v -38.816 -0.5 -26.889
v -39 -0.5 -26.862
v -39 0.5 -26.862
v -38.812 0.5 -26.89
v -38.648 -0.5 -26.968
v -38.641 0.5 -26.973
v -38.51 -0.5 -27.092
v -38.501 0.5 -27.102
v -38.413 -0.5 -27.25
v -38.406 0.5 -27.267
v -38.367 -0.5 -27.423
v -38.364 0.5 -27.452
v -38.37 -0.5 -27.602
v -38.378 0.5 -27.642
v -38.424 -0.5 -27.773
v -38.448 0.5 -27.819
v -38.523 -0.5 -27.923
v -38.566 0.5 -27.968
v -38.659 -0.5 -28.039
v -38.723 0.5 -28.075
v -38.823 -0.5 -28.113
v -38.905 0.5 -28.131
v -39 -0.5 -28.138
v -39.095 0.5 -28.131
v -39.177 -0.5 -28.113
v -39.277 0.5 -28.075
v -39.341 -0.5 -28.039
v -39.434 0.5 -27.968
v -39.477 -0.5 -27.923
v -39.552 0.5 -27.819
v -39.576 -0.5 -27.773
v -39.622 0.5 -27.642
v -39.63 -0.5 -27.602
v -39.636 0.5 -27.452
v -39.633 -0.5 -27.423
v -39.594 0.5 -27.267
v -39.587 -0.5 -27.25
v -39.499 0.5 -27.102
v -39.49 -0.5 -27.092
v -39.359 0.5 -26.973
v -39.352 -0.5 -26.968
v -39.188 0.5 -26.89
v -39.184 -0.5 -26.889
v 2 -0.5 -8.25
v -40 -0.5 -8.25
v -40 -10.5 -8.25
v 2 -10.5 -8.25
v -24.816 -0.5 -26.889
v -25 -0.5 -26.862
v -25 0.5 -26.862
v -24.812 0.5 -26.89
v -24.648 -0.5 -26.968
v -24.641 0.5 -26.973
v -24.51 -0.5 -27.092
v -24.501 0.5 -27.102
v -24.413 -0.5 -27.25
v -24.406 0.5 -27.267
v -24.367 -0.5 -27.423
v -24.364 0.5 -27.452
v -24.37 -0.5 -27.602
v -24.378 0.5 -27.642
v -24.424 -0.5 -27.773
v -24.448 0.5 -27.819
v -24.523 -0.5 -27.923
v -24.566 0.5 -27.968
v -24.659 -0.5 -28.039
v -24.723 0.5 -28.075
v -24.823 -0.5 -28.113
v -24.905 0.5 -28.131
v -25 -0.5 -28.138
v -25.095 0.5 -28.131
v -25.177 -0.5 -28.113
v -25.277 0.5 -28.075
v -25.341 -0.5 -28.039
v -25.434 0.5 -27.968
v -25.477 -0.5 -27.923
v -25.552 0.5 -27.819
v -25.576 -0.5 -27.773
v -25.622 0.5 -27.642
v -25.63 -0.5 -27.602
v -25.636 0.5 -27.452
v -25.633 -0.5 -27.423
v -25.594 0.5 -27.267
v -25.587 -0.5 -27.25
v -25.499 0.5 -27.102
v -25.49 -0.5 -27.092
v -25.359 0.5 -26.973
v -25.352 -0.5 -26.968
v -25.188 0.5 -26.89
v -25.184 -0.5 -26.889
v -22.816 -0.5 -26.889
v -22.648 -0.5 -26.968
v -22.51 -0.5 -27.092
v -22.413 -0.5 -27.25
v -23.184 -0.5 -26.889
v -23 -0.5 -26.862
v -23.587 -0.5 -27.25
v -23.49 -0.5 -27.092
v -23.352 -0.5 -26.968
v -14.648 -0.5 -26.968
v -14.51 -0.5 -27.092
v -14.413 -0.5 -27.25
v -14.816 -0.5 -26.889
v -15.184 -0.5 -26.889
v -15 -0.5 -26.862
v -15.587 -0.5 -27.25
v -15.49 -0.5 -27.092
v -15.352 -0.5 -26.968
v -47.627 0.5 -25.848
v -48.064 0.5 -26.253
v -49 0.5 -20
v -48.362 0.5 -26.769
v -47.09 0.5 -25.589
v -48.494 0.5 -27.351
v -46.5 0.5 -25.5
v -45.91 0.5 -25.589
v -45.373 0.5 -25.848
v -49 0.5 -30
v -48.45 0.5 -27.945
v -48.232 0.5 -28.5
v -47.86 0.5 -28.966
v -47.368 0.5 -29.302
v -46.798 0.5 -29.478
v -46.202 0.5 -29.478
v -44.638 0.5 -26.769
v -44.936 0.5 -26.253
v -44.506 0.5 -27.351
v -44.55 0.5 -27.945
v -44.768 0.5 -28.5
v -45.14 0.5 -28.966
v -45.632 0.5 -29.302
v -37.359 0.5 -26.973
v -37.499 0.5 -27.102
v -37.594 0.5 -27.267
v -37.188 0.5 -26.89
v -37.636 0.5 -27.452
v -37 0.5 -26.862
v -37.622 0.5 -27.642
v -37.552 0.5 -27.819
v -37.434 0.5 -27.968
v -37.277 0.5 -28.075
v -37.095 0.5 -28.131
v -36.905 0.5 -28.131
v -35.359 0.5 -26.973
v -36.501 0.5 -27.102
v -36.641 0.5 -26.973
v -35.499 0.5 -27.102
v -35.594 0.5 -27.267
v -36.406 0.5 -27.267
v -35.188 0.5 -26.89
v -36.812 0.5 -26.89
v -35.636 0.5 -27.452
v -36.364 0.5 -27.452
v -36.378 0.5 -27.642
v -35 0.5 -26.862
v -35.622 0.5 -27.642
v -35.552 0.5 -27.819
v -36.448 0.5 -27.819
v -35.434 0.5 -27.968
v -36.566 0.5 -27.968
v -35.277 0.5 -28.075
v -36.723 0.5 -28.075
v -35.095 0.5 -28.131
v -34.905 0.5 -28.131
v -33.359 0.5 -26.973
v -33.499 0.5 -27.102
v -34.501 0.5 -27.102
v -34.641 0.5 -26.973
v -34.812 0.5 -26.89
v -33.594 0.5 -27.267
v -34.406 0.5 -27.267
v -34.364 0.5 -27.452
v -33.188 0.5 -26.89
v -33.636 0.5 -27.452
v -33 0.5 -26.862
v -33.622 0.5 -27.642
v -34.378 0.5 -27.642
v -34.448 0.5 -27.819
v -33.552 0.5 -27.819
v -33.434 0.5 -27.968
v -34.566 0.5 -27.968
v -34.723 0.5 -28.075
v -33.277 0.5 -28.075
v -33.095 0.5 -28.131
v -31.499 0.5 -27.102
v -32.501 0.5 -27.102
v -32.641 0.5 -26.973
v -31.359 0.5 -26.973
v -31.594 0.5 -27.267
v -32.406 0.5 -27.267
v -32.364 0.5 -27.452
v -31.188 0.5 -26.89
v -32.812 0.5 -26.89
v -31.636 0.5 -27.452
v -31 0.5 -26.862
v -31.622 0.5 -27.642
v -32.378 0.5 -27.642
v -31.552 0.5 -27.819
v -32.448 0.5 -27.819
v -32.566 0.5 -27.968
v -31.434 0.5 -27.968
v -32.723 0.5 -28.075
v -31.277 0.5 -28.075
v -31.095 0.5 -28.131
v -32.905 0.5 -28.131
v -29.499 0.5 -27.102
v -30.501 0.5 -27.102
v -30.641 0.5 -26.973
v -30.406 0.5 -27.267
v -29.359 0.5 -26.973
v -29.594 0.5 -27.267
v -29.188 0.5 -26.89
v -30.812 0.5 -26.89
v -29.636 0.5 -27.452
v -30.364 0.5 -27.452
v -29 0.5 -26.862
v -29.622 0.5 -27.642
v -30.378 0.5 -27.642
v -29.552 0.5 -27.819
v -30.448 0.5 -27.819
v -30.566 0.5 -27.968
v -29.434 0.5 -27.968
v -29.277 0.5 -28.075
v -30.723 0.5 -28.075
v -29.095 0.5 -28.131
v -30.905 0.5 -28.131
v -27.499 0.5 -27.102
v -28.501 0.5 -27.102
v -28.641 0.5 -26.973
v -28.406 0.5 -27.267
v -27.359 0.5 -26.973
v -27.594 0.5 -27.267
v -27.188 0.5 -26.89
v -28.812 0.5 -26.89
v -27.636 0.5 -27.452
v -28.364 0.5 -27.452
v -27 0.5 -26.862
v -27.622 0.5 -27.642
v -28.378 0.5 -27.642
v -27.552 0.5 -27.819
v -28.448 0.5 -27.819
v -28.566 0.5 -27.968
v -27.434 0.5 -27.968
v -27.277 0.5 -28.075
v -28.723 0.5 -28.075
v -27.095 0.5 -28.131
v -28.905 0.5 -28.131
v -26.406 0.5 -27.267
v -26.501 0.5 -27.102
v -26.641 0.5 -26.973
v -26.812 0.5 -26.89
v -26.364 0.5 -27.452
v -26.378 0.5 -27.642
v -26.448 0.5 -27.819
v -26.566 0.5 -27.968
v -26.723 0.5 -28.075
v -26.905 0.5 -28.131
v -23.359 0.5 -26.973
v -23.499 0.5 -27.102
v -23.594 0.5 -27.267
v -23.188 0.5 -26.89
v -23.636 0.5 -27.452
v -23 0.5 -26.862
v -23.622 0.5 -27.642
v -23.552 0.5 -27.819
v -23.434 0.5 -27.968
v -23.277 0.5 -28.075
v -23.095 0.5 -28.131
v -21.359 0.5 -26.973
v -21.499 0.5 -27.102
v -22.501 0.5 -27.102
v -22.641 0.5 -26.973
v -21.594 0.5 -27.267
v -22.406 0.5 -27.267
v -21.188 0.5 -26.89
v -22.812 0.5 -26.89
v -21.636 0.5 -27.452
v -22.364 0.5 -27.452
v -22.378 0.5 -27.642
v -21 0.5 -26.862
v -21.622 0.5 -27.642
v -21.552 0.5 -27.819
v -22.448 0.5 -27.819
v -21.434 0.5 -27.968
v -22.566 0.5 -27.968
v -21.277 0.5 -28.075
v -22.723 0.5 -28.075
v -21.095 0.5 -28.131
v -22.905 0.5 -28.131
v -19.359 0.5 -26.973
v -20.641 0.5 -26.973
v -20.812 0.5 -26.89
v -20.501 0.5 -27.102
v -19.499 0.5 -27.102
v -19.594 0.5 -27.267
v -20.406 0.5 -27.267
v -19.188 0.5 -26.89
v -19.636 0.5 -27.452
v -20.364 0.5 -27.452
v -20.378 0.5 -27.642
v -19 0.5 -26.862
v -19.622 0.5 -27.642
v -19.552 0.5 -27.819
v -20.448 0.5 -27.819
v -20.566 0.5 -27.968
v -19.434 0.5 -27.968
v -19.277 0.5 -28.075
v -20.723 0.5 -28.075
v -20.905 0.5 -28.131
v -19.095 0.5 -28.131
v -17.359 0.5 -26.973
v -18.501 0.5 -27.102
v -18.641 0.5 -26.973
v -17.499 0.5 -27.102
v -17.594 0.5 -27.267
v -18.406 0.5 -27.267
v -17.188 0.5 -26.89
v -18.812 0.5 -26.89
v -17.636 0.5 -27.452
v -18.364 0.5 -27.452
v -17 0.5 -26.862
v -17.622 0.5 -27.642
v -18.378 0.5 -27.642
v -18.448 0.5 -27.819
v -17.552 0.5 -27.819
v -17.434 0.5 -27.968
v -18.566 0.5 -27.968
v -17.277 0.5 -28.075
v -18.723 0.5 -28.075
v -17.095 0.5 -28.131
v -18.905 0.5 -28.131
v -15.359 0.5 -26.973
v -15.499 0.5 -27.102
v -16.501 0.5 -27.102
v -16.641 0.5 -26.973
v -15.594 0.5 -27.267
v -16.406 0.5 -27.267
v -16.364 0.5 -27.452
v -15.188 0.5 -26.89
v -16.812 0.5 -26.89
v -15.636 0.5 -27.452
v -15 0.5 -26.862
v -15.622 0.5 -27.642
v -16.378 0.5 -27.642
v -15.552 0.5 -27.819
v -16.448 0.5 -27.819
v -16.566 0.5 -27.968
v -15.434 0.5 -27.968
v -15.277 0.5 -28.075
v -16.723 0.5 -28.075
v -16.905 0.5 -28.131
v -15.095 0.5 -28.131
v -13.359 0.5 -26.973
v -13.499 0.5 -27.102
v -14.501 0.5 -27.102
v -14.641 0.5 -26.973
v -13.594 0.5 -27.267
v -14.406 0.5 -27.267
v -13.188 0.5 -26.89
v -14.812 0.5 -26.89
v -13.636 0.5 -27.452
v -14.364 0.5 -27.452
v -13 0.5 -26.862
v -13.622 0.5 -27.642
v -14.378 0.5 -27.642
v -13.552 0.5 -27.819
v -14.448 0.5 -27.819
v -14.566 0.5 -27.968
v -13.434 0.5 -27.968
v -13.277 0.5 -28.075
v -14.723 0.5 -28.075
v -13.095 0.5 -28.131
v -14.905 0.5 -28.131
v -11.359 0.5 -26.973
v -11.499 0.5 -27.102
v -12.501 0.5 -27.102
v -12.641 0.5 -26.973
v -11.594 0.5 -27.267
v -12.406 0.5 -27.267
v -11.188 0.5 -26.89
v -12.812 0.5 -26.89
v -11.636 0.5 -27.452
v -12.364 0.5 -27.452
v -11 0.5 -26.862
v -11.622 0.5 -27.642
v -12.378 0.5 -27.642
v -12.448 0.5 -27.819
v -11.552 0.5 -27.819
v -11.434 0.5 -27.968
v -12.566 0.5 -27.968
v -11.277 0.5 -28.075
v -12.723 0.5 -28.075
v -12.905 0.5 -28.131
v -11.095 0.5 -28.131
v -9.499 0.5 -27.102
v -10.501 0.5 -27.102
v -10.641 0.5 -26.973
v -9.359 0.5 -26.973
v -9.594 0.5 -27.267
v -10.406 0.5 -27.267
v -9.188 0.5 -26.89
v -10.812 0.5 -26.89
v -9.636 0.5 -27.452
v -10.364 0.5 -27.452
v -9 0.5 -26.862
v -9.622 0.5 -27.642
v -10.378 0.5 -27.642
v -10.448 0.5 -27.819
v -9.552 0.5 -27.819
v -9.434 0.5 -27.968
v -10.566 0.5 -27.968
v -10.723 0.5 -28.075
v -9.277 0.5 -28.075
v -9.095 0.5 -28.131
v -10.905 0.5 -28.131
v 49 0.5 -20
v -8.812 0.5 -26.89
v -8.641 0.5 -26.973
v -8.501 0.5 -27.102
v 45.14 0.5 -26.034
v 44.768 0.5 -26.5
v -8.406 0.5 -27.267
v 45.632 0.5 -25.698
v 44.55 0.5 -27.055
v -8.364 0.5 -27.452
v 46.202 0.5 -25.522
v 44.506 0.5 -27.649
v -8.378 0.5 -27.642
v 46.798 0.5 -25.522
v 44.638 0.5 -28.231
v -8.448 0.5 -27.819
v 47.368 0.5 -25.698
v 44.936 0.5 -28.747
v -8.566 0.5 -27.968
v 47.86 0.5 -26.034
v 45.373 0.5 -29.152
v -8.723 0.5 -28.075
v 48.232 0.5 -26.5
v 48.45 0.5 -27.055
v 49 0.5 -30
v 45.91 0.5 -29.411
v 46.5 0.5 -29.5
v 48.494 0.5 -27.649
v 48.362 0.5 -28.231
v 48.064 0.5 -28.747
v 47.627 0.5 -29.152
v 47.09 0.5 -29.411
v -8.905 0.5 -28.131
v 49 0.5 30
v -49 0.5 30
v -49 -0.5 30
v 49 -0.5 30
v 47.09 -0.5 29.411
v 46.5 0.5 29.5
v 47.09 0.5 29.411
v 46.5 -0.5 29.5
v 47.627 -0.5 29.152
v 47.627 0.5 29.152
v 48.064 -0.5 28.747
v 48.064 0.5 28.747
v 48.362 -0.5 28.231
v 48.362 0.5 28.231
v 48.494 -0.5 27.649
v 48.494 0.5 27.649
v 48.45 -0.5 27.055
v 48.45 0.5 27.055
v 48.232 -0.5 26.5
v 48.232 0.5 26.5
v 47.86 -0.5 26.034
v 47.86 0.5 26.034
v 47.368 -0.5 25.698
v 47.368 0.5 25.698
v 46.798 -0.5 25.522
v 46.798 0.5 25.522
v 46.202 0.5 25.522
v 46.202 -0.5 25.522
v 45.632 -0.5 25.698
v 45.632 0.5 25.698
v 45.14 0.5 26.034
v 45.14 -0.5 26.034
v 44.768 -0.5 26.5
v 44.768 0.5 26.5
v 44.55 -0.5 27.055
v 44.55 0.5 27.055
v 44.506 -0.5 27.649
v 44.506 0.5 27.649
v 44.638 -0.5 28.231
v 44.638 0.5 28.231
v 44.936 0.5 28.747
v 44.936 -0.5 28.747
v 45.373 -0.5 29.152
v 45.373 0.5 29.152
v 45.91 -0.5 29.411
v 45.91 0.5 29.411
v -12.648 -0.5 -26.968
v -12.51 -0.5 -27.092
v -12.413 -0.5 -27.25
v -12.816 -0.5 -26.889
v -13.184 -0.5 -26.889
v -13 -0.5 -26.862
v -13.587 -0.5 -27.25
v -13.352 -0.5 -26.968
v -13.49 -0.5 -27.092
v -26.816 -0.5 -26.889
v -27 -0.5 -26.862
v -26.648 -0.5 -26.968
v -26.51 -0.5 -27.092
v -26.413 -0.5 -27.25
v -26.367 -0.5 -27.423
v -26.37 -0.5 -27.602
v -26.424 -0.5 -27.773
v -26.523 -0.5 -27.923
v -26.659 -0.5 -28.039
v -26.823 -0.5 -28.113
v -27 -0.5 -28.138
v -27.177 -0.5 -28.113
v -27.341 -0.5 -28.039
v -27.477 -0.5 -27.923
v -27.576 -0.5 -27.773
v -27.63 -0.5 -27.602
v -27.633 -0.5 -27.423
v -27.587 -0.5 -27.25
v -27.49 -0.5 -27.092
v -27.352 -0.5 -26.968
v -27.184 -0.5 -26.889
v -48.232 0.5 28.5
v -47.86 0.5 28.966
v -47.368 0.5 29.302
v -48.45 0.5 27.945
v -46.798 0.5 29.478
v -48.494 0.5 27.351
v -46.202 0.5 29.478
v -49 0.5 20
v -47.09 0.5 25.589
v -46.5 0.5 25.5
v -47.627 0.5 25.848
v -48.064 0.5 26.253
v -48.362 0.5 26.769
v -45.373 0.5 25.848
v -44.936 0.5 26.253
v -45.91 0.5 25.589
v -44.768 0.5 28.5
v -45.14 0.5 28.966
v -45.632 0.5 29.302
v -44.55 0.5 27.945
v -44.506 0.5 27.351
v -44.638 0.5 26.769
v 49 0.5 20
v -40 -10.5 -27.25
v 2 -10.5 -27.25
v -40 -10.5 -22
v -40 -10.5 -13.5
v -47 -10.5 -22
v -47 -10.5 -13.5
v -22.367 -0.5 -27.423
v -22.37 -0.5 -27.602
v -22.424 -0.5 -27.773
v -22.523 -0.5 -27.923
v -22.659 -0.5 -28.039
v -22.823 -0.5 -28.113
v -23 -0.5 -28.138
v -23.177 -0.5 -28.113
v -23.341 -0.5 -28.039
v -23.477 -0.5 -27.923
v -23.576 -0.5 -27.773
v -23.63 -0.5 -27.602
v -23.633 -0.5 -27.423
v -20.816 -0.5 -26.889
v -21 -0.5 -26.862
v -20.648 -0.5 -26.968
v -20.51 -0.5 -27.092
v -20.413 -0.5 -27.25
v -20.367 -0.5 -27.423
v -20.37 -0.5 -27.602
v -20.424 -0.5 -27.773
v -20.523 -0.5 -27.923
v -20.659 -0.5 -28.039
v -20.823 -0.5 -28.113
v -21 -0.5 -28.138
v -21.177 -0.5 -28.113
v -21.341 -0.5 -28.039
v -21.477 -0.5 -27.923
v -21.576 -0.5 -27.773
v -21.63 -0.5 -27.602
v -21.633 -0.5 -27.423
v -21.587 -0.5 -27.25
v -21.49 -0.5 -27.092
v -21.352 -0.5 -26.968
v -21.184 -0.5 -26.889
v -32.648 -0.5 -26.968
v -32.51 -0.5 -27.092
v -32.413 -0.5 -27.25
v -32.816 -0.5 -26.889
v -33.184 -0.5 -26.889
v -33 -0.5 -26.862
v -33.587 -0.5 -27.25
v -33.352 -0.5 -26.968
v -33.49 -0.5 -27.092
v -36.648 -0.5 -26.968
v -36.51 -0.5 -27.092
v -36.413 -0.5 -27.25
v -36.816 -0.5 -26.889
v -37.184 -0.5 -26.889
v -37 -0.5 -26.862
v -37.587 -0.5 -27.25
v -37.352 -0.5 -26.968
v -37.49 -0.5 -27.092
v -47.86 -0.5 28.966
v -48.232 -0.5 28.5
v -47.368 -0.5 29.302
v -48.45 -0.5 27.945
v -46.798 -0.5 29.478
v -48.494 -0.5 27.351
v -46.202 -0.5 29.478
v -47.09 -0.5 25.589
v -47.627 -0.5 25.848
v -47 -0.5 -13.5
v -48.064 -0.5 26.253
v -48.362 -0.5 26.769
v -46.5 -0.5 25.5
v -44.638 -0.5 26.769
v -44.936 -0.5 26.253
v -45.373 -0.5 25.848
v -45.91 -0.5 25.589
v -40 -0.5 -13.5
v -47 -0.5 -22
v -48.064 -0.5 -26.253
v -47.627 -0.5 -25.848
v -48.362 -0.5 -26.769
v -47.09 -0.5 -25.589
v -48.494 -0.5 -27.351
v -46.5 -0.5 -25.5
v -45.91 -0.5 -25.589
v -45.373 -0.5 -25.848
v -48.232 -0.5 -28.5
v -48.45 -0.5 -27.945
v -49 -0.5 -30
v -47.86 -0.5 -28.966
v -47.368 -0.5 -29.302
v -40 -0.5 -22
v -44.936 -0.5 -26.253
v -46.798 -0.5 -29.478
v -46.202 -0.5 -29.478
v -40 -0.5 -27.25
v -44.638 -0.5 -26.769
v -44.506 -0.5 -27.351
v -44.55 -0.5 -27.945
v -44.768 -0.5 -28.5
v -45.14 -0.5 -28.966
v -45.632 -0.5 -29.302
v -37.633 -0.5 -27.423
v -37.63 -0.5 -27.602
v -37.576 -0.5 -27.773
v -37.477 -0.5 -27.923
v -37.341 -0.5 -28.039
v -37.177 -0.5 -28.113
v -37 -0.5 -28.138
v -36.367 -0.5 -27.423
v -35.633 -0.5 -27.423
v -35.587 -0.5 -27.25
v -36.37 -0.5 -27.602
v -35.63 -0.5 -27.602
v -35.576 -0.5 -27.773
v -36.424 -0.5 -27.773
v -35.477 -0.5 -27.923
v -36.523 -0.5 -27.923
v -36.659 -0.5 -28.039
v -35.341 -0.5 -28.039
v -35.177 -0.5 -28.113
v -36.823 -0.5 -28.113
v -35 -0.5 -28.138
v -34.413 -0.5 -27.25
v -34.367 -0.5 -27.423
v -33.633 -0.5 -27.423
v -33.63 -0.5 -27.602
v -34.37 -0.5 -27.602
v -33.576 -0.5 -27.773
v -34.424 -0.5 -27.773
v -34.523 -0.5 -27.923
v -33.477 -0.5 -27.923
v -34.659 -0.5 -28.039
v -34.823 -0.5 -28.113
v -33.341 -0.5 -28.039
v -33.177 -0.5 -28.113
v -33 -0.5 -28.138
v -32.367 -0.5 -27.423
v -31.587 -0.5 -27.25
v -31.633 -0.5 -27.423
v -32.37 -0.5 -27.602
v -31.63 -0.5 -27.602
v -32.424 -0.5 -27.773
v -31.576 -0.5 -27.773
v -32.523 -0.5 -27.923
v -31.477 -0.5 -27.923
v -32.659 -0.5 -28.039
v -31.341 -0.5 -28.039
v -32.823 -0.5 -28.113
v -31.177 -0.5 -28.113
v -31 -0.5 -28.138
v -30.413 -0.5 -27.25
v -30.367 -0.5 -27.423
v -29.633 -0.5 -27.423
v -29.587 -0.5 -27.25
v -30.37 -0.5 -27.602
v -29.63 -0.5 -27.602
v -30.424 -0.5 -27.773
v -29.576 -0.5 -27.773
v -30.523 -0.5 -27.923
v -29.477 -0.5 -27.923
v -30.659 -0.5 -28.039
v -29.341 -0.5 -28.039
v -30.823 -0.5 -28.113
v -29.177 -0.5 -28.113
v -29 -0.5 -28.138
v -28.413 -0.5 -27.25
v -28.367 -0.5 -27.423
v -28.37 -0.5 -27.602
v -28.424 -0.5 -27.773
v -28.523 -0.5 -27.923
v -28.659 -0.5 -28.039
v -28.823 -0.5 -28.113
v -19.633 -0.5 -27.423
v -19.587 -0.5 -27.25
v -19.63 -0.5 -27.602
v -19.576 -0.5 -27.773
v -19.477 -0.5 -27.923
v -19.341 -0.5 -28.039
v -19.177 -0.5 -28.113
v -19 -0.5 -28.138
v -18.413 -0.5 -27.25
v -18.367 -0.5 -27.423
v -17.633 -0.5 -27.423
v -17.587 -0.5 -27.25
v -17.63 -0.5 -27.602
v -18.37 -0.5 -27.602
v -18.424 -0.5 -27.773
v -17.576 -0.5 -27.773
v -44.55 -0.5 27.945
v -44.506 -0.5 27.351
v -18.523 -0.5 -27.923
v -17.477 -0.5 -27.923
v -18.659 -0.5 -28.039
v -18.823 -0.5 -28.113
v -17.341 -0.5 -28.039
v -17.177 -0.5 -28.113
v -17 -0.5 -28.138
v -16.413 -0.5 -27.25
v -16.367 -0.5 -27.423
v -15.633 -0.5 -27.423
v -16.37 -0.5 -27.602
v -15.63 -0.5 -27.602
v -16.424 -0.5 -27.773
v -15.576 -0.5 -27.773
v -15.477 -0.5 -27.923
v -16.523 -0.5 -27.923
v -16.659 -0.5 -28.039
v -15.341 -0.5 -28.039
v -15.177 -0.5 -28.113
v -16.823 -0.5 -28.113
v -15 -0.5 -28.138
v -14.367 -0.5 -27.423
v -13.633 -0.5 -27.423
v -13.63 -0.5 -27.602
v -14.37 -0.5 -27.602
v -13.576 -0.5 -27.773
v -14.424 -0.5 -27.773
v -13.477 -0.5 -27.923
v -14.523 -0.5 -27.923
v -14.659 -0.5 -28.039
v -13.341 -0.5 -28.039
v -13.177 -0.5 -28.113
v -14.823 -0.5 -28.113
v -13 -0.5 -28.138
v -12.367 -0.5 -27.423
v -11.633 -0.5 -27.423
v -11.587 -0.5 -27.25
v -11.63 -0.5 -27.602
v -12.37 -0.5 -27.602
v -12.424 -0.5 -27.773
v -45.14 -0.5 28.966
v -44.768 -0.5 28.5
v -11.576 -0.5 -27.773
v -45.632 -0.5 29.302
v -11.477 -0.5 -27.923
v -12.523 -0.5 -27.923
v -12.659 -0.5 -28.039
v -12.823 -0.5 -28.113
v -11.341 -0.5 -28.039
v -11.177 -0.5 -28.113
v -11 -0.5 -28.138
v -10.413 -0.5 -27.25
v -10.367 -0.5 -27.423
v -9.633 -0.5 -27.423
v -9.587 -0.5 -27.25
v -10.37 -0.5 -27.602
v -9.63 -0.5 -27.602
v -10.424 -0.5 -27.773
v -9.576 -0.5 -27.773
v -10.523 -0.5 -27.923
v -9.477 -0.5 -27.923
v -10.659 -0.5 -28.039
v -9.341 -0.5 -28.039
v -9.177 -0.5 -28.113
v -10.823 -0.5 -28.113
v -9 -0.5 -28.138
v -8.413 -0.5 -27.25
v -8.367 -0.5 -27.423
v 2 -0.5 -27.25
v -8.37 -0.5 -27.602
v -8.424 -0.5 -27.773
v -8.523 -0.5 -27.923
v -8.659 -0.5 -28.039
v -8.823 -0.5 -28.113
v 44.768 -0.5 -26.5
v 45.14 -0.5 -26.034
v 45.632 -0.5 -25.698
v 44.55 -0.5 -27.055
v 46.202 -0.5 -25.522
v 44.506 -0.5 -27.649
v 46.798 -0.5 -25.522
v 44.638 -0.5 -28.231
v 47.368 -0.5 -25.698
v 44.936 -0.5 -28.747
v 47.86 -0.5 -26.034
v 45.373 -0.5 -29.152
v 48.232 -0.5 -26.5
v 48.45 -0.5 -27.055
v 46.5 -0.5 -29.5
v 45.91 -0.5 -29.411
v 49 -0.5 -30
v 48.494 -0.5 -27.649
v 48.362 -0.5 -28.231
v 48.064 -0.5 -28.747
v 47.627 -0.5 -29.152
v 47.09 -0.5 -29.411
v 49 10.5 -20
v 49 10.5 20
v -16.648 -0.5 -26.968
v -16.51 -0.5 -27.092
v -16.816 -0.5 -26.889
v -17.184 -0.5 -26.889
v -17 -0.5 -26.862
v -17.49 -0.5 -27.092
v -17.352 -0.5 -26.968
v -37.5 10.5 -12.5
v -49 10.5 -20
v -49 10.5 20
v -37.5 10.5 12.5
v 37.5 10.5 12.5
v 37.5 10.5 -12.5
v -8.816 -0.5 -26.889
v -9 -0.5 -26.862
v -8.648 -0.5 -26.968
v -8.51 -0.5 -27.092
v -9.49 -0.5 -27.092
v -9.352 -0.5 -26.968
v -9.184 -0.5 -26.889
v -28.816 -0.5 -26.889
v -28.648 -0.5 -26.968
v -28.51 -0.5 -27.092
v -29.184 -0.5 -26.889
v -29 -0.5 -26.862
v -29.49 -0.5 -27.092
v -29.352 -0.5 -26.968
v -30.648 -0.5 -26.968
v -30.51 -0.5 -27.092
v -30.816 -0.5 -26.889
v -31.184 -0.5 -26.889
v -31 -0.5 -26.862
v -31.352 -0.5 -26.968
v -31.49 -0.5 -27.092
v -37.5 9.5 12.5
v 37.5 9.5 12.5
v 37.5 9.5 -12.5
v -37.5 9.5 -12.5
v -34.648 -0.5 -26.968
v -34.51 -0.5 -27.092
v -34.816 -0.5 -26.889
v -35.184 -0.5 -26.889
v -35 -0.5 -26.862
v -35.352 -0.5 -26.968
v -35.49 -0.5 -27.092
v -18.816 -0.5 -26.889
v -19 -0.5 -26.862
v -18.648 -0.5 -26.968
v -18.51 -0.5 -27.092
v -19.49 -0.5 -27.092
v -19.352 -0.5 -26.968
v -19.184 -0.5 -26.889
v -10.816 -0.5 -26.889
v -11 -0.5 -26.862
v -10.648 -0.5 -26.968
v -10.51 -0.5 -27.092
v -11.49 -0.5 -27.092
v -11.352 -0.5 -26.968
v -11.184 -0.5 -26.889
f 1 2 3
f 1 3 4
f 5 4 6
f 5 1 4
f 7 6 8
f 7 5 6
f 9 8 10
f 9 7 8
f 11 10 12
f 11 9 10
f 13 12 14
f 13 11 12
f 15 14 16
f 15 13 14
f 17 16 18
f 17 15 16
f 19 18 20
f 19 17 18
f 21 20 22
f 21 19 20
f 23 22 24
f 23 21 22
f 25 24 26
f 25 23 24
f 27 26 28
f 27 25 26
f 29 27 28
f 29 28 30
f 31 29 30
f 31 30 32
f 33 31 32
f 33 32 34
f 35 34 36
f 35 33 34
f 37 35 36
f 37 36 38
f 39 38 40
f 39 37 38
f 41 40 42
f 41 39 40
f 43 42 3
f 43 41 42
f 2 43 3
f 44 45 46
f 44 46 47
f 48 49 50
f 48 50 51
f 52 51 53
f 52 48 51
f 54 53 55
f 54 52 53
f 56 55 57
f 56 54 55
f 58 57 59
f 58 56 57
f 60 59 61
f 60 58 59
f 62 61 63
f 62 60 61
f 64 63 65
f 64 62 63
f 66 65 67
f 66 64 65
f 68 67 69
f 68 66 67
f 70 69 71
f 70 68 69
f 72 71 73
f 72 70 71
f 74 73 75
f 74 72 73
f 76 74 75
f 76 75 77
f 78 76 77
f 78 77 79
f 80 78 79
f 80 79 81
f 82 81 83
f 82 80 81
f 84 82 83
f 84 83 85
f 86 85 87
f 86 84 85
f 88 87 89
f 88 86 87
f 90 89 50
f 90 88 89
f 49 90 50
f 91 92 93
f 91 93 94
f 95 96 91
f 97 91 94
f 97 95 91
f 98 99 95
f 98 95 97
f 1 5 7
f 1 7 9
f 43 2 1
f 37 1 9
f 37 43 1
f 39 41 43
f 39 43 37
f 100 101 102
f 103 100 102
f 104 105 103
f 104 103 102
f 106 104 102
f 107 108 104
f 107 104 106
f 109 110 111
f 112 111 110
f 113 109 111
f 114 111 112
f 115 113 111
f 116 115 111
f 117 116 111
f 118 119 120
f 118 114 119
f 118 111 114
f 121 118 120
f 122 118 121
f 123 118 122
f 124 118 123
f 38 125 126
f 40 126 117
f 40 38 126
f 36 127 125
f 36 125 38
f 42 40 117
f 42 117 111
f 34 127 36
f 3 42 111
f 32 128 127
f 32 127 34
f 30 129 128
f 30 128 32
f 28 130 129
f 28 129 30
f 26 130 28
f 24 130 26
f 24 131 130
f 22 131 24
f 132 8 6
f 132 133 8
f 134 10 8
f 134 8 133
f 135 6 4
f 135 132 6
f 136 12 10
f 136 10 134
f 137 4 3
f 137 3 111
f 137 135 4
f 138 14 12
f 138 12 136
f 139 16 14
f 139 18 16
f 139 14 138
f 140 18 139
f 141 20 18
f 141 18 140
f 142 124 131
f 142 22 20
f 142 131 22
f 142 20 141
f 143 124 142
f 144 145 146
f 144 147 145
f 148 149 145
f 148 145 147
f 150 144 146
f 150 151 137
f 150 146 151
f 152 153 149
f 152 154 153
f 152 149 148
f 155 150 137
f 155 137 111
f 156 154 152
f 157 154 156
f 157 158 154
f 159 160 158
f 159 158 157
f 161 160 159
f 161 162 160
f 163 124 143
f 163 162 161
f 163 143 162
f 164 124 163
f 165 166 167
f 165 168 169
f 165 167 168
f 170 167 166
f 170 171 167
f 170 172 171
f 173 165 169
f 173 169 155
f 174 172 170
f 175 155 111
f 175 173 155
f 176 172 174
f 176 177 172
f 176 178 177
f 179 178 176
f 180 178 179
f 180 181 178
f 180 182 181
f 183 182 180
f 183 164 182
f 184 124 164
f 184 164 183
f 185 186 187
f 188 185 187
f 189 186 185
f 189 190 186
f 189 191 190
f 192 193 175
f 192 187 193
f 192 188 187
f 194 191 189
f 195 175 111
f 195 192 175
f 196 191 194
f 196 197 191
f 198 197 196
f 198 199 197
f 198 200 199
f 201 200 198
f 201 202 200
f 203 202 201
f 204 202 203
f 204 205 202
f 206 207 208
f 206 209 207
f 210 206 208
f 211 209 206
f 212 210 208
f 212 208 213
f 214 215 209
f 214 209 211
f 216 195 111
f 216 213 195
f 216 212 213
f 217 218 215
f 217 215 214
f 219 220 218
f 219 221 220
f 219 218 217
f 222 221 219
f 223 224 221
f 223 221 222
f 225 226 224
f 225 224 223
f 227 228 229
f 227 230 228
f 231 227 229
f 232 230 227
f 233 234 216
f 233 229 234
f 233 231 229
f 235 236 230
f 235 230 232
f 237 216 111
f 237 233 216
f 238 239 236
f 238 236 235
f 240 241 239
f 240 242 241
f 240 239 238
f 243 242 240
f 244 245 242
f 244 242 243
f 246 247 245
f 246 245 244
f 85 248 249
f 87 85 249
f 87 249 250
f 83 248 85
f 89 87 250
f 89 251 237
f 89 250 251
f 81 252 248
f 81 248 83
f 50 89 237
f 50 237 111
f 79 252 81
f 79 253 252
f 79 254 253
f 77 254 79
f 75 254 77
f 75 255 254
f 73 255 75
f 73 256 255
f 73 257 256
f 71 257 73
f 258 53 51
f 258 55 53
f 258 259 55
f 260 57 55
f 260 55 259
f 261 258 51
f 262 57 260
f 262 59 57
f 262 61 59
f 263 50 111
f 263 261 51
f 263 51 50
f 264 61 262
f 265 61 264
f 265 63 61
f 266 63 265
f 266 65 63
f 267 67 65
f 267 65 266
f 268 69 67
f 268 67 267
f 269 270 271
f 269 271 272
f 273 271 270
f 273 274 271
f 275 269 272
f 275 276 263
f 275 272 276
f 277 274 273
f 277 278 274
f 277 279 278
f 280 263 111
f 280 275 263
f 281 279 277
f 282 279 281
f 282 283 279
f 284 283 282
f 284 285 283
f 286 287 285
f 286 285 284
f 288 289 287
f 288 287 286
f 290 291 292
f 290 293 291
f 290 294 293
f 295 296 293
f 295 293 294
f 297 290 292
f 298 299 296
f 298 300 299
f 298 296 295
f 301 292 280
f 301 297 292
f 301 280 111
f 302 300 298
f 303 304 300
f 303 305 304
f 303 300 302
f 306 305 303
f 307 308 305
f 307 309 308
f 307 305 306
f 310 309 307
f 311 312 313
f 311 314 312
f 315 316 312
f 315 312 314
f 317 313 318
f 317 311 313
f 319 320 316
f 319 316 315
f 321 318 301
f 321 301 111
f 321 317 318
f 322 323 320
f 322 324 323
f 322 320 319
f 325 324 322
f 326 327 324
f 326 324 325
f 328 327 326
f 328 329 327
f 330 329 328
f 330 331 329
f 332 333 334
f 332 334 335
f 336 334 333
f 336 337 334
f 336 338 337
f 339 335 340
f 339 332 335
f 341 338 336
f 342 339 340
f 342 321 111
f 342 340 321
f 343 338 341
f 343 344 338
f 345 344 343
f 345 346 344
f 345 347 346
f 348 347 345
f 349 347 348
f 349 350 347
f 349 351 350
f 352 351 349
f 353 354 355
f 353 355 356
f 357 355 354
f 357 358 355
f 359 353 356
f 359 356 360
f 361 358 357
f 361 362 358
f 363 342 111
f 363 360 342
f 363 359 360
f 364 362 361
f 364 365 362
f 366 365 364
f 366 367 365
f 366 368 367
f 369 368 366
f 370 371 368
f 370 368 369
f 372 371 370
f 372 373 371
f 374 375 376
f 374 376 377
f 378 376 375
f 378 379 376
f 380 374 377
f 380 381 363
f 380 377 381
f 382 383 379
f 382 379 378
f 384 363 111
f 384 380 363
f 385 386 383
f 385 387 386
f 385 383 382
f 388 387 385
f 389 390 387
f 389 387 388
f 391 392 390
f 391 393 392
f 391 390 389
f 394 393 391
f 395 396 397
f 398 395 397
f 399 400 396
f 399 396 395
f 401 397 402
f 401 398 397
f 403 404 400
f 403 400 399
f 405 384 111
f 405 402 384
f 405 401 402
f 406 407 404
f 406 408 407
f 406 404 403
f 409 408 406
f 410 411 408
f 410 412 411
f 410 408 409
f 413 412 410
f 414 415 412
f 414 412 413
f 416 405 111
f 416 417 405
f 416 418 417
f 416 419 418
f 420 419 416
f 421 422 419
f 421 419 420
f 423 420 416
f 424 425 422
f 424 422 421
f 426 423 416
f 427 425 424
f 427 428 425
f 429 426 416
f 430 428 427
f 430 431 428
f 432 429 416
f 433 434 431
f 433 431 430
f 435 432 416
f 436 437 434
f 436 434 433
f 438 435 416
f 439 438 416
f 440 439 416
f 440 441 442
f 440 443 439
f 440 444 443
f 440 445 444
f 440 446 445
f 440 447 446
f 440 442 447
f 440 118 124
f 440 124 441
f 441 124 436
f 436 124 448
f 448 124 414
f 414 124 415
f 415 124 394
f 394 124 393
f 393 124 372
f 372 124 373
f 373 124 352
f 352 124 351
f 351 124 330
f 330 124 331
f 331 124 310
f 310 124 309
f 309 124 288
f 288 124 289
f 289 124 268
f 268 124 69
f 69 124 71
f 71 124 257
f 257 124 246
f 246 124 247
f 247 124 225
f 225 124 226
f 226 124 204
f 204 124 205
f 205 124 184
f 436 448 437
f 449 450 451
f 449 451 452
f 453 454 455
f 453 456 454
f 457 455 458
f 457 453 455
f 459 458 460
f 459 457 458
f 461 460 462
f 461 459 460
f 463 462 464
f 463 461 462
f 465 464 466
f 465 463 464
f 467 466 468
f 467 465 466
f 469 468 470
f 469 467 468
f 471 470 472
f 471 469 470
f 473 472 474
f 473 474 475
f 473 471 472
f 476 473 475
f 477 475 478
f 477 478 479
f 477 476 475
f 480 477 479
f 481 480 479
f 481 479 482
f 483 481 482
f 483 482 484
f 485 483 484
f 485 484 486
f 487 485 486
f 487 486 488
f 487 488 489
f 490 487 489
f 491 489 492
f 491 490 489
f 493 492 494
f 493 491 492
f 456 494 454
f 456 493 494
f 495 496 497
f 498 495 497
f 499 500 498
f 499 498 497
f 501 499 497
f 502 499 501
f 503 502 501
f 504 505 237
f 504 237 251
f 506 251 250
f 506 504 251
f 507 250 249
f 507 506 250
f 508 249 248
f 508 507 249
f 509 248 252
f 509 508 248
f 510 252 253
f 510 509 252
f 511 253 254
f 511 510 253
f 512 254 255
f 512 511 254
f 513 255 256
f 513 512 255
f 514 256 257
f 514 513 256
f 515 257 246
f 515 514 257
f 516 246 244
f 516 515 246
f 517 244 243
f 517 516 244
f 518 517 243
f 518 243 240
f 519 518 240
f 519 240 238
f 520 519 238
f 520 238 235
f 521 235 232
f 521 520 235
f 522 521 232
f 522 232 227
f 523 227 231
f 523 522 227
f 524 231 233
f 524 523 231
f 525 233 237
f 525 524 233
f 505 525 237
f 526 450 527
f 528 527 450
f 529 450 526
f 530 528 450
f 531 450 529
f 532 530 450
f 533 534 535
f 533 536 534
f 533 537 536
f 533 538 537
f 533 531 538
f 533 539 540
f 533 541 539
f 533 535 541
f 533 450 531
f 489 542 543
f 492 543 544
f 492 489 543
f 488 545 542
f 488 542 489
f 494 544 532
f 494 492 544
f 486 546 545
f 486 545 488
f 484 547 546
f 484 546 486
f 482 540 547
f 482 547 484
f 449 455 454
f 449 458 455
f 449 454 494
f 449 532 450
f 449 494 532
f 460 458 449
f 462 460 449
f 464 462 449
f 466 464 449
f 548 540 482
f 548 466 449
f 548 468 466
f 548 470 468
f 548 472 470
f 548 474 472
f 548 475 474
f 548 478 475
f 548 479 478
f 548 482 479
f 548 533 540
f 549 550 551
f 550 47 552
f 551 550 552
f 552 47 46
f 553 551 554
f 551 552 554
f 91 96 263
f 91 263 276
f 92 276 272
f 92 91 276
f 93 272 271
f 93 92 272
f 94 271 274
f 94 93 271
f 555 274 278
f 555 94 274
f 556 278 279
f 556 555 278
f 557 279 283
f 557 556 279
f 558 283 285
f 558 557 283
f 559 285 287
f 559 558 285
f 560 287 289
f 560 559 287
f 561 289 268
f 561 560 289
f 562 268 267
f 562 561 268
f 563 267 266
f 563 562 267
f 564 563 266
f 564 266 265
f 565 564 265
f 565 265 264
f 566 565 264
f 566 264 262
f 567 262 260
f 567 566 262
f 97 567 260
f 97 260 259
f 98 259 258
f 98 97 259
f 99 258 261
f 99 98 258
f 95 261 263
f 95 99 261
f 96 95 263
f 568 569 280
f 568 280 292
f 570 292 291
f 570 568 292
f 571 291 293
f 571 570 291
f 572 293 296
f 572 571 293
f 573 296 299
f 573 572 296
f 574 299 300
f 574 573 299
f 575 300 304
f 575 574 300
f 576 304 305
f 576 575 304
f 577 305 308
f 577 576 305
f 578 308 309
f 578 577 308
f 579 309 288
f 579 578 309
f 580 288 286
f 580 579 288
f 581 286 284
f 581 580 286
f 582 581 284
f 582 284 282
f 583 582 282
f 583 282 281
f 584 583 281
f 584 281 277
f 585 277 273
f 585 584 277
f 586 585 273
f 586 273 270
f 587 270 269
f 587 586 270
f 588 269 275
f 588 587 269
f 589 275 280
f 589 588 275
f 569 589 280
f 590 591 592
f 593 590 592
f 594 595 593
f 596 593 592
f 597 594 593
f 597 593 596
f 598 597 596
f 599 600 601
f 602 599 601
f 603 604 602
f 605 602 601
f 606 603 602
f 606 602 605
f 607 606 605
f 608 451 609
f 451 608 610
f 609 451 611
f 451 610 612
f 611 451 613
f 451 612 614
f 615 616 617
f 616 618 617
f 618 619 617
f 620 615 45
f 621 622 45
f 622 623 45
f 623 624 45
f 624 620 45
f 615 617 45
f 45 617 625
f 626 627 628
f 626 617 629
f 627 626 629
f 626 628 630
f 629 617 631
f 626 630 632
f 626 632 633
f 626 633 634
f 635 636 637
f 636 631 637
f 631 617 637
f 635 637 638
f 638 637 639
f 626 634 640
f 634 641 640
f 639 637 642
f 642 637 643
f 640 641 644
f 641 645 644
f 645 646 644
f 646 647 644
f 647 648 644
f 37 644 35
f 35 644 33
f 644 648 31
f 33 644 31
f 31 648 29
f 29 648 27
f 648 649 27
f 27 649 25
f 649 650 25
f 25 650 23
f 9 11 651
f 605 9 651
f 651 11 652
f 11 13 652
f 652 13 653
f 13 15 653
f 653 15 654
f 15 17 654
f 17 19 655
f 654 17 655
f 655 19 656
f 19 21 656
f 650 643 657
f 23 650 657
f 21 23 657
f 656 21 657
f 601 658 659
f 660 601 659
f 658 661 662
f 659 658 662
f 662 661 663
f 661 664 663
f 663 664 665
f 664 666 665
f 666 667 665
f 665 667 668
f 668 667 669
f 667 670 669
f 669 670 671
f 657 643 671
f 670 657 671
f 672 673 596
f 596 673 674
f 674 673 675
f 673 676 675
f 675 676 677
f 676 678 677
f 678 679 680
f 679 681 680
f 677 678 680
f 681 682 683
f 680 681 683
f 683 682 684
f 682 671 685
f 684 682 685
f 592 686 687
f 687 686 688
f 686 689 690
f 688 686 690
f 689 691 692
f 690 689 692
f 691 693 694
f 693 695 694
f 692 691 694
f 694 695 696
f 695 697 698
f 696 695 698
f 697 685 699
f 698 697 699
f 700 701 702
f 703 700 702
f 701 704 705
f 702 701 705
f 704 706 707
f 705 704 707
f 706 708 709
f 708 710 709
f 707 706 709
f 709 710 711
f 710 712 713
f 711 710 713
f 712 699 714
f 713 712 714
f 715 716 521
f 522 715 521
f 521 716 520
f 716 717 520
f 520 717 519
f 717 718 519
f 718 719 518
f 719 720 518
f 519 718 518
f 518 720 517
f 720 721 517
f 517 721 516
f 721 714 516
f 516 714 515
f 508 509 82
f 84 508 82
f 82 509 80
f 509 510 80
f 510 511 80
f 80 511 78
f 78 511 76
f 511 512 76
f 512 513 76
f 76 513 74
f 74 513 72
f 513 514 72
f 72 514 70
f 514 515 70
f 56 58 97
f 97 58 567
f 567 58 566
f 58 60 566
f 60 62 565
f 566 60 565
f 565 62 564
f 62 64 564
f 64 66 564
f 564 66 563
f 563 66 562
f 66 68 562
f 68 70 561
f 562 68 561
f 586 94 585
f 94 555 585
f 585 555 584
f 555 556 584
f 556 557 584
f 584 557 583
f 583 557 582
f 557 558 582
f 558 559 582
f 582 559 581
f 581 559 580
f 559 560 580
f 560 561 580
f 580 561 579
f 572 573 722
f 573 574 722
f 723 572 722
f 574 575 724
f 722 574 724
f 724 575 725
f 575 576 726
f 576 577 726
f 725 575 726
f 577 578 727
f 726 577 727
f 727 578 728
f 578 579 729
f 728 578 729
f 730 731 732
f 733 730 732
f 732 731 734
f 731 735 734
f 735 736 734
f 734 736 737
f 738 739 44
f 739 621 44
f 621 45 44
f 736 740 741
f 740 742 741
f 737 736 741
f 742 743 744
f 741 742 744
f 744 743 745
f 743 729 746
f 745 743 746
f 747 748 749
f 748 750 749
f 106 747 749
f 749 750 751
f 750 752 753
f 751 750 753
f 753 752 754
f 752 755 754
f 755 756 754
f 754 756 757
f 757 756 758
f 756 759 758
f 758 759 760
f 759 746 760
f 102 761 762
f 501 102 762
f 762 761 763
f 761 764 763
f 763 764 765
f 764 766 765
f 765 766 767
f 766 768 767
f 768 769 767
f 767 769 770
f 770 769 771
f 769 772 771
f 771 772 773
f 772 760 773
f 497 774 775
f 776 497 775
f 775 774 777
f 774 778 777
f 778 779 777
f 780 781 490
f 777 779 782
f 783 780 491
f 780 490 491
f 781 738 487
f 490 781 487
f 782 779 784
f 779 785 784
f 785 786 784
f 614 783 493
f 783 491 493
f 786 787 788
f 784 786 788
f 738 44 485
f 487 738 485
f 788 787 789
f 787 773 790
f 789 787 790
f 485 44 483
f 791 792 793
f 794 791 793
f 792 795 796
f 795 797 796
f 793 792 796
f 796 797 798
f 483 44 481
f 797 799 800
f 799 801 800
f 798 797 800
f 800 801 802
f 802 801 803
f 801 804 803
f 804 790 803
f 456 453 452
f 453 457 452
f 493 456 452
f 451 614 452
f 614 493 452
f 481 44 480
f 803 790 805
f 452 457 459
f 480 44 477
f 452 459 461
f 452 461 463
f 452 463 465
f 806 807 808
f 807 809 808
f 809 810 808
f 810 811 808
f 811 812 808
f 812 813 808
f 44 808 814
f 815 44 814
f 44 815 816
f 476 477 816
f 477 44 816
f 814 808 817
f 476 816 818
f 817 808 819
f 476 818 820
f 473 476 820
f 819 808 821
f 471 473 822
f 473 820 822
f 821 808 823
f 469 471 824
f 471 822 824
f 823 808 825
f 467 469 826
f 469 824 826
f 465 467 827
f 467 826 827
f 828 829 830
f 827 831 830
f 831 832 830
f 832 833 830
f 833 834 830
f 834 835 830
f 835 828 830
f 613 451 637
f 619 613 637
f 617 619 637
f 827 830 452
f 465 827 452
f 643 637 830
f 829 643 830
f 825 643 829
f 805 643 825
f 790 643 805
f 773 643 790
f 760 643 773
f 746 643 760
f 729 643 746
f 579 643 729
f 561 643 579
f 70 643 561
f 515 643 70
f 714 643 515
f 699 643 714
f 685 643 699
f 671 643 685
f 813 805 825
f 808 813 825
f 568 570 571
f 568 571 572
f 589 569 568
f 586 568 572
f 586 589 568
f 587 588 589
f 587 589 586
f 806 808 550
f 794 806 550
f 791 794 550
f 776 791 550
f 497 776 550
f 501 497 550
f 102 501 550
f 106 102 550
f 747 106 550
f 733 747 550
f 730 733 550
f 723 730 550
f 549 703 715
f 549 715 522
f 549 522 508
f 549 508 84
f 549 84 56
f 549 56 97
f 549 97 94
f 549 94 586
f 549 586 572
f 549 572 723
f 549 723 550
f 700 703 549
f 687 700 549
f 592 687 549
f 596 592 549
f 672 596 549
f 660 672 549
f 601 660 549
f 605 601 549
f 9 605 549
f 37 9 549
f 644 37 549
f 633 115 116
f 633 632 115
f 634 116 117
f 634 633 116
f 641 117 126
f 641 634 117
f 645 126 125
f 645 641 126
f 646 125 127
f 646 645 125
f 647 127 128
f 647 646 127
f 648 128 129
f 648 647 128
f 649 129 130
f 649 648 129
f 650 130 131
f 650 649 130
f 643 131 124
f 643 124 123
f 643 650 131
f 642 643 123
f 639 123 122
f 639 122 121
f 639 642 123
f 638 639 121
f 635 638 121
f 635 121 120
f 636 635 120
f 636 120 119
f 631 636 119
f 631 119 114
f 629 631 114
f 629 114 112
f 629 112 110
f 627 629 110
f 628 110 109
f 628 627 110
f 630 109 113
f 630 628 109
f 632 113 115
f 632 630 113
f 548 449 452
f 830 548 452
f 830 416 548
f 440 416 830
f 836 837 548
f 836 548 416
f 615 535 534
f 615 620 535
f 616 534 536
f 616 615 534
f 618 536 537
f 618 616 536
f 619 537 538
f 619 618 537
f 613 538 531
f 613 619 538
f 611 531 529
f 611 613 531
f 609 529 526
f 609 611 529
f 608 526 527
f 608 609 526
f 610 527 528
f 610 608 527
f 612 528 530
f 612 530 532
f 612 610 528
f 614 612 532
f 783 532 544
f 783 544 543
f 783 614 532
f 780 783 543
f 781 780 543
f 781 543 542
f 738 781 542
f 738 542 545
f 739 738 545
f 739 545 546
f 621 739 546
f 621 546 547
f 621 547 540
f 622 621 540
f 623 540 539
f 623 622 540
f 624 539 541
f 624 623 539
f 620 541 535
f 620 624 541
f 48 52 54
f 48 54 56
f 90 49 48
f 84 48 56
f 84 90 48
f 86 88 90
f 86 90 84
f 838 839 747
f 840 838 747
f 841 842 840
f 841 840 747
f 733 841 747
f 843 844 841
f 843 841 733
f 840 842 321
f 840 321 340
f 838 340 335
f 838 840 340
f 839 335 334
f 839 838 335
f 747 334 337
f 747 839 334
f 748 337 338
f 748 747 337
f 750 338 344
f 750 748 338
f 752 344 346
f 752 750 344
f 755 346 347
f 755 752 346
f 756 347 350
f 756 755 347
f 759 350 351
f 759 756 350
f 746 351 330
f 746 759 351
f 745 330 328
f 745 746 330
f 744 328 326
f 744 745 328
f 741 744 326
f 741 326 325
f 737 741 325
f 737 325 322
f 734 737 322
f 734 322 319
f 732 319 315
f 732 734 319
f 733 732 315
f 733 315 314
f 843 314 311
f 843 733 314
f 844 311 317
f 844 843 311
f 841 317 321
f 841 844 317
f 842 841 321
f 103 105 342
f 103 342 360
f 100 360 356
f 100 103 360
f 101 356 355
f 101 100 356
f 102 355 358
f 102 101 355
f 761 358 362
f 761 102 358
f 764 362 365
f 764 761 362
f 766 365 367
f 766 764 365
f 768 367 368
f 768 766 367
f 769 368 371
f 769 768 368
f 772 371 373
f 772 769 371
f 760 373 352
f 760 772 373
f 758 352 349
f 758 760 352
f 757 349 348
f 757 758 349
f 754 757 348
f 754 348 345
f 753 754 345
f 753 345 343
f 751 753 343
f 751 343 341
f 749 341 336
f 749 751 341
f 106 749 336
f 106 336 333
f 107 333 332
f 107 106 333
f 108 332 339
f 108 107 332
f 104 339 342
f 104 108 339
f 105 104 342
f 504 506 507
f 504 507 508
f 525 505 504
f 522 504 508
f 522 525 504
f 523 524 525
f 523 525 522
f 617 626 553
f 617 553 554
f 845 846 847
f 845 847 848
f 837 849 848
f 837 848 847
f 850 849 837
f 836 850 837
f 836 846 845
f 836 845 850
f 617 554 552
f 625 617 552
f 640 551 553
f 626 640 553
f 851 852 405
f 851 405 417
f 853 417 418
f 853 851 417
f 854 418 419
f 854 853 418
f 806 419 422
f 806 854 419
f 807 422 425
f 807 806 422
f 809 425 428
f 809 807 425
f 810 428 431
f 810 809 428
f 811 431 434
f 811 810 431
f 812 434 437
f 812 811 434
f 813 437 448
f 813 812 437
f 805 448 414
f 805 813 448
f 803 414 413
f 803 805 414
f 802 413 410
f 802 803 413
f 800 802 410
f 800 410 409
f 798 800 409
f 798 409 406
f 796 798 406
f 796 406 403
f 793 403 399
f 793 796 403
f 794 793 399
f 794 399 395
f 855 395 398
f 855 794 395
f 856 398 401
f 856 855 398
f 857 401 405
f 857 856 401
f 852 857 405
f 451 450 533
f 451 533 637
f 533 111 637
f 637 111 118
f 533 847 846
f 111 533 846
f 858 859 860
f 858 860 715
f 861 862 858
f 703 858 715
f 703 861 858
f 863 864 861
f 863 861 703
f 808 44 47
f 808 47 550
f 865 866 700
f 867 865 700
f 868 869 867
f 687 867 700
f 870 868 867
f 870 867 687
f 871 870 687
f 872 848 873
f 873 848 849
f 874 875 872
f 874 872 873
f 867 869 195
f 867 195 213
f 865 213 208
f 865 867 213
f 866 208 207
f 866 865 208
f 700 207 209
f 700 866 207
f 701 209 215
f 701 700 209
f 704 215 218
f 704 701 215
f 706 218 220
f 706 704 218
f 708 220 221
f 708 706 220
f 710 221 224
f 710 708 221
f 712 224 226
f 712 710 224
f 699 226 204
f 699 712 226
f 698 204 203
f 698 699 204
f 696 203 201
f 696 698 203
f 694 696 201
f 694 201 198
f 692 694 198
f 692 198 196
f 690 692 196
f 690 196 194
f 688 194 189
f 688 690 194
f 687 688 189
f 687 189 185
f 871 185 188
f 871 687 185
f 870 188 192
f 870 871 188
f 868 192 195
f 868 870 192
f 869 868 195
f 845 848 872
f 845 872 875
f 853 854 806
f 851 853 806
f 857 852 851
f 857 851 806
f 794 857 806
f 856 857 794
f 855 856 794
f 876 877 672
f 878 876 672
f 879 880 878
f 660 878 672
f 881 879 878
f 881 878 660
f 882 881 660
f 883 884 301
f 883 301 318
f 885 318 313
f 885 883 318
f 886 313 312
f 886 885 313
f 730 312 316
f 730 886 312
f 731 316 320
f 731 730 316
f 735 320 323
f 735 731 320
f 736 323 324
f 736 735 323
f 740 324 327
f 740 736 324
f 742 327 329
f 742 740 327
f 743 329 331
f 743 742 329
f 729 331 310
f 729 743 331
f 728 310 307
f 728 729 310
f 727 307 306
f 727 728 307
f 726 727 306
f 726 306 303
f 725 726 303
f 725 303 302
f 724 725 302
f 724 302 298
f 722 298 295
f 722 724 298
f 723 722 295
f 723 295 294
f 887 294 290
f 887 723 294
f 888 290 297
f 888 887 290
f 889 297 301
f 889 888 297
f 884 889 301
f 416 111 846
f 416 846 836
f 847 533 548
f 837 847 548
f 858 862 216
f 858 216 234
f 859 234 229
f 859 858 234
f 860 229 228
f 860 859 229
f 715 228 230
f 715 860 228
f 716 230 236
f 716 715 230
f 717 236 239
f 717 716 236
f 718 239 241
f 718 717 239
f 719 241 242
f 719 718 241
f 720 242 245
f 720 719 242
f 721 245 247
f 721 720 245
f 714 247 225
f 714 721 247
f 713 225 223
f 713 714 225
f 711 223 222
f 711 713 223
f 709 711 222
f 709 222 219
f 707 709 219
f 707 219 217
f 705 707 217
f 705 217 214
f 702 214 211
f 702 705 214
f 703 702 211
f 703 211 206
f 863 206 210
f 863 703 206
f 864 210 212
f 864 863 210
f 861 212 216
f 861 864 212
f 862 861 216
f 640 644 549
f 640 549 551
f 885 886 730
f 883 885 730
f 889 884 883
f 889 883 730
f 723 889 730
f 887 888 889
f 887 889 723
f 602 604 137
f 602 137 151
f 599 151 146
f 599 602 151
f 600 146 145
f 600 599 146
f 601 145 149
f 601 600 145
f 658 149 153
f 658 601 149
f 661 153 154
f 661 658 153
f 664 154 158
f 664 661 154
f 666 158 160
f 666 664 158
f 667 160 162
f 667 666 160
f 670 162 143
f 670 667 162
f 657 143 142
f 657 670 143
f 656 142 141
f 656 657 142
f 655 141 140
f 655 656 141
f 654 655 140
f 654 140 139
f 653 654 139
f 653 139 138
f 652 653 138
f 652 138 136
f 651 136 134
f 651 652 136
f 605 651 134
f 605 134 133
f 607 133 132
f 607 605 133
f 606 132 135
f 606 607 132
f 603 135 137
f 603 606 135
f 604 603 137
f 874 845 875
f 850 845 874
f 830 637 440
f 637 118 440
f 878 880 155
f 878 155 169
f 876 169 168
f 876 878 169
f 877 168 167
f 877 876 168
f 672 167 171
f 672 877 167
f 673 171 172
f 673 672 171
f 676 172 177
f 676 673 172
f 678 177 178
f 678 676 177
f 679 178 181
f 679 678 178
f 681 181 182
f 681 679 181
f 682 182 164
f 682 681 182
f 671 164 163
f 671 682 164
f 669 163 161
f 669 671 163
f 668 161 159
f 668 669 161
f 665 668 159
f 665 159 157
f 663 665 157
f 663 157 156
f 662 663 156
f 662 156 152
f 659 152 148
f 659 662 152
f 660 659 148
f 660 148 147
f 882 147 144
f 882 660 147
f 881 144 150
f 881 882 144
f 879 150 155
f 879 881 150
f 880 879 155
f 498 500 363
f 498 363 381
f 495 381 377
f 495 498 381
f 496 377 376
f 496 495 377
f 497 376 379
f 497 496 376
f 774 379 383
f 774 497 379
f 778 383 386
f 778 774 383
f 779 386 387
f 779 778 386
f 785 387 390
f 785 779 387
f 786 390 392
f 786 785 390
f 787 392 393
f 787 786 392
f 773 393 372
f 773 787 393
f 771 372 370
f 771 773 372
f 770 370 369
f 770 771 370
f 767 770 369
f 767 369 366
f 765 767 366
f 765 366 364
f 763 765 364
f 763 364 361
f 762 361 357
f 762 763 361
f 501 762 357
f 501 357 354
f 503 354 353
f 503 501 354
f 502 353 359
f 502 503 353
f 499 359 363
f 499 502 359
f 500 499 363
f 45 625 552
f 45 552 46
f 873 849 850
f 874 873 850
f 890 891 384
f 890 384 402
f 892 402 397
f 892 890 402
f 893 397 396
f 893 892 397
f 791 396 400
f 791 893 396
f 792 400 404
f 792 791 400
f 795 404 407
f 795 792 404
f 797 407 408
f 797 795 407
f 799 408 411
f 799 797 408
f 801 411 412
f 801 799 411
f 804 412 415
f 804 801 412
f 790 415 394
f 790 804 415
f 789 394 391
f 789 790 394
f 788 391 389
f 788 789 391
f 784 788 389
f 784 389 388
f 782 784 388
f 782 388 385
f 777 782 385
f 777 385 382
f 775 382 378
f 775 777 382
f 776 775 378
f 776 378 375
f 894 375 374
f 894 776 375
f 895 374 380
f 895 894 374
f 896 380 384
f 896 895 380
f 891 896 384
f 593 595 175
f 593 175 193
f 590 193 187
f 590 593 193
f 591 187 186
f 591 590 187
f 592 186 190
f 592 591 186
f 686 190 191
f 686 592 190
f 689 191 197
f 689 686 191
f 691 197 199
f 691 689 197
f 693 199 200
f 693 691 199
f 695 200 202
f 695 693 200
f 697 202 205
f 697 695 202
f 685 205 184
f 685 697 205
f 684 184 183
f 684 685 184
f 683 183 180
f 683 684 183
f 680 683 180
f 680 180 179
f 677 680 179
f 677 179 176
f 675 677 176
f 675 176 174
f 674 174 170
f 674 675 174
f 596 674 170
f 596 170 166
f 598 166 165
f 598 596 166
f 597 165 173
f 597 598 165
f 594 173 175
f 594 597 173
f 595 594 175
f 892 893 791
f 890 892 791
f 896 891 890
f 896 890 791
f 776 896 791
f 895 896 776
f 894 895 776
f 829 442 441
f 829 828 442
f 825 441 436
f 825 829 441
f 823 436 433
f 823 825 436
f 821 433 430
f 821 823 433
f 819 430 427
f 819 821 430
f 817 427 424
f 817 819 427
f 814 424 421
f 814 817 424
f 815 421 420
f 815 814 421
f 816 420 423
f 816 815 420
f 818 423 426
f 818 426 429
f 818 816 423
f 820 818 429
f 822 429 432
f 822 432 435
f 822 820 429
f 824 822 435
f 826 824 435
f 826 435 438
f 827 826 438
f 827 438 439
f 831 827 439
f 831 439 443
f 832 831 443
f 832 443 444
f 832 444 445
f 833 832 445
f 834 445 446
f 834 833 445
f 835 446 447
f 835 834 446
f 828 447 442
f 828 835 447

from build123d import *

# Parameters (mm, degrees)
ESQUISSE1_W             = 98
ESQUISSE1_H             = 60
ESQUISSE1_R             = 2
ESQUISSE1_R_2           = 0.637876667
BOSS_EXTRU_1_DEPTH      = 0.5
ESQUISSE3_W             = 98
ESQUISSE3_H             = 40
BOSS_EXTRU_2_DEPTH      = 10
ESQUISSE4_W             = 75
ESQUISSE4_H             = 25
ENL_V_MAT_EXTRU_1_DEPTH = 1
BOSS_EXTRU_4_DEPTH      = 10


with BuildPart() as part:
    # Esquisse1 → Boss.-Extru.1 (new, symmetric)
    with BuildSketch(Plane(origin=(0, 0, 0), x_dir=(1, 0, 0), z_dir=(0, 1, 0))):
        Rectangle(ESQUISSE1_W, ESQUISSE1_H)
        with Locations(Location((-46.5, 27.5, 0), (0, 0, 270))):
            Circle(ESQUISSE1_R, mode=Mode.SUBTRACT)
        with Locations(Location((46.5, 27.5, 0), (0, 0, 90))):
            Circle(ESQUISSE1_R, mode=Mode.SUBTRACT)
        with Locations(Location((46.5, -27.5, 0), (0, 0, 270))):
            Circle(ESQUISSE1_R, mode=Mode.SUBTRACT)
        with Locations(Location((-46.5, -27.5, 0), (0, 0, 90))):
            Circle(ESQUISSE1_R, mode=Mode.SUBTRACT)
        with Locations(Location((-39, 27.5, 0), (0, 0, 270))):
            Circle(ESQUISSE1_R_2, mode=Mode.SUBTRACT)
        with Locations(Location((-37, 27.5, 0), (0, 0, 270))):
            Circle(ESQUISSE1_R_2, mode=Mode.SUBTRACT)
        with Locations(Location((-35, 27.5, 0), (0, 0, 270))):
            Circle(ESQUISSE1_R_2, mode=Mode.SUBTRACT)
        with Locations(Location((-33, 27.5, 0), (0, 0, 270))):
            Circle(ESQUISSE1_R_2, mode=Mode.SUBTRACT)
        with Locations(Location((-31, 27.5, 0), (0, 0, 270))):
            Circle(ESQUISSE1_R_2, mode=Mode.SUBTRACT)
        with Locations(Location((-29, 27.5, 0), (0, 0, 270))):
            Circle(ESQUISSE1_R_2, mode=Mode.SUBTRACT)
        with Locations(Location((-27, 27.5, 0), (0, 0, 270))):
            Circle(ESQUISSE1_R_2, mode=Mode.SUBTRACT)
        with Locations(Location((-25, 27.5, 0), (0, 0, 270))):
            Circle(ESQUISSE1_R_2, mode=Mode.SUBTRACT)
        with Locations(Location((-23, 27.5, 0), (0, 0, 270))):
            Circle(ESQUISSE1_R_2, mode=Mode.SUBTRACT)
        with Locations(Location((-21, 27.5, 0), (0, 0, 270))):
            Circle(ESQUISSE1_R_2, mode=Mode.SUBTRACT)
        with Locations(Location((-19, 27.5, 0), (0, 0, 270))):
            Circle(ESQUISSE1_R_2, mode=Mode.SUBTRACT)
        with Locations(Location((-17, 27.5, 0), (0, 0, 270))):
            Circle(ESQUISSE1_R_2, mode=Mode.SUBTRACT)
        with Locations(Location((-15, 27.5, 0), (0, 0, 270))):
            Circle(ESQUISSE1_R_2, mode=Mode.SUBTRACT)
        with Locations(Location((-13, 27.5, 0), (0, 0, 270))):
            Circle(ESQUISSE1_R_2, mode=Mode.SUBTRACT)
        with Locations(Location((-11, 27.5, 0), (0, 0, 270))):
            Circle(ESQUISSE1_R_2, mode=Mode.SUBTRACT)
        with Locations(Location((-9, 27.5, 0), (0, 0, 270))):
            Circle(ESQUISSE1_R_2, mode=Mode.SUBTRACT)
    extrude(amount=BOSS_EXTRU_1_DEPTH, both=True)

    # Esquisse3 → Boss.-Extru.2 (add)
    with BuildSketch(Plane(origin=(0, 0.5, 0), x_dir=(1, 0, 0), z_dir=(0, 1, 0))):
        Rectangle(ESQUISSE3_W, ESQUISSE3_H)
    extrude(amount=BOSS_EXTRU_2_DEPTH)

    # Esquisse4 → Enlèv. mat.-Extru.1 (cut)
    with BuildSketch(Plane(origin=(0, 10.5, 0), x_dir=(1, 0, 0), z_dir=(0, 1, 0))):
        Rectangle(ESQUISSE4_W, ESQUISSE4_H)
    extrude(amount=-ENL_V_MAT_EXTRU_1_DEPTH, mode=Mode.SUBTRACT)

    # Esquisse5 → Boss.-Extru.4 (add)
    with BuildSketch(Plane.XZ.offset(0.5)):
        Polygon((-40, -27.25), (-40, -22), (-47, -22), (-47, -13.5), (-40, -13.5), (-40, -8.25), (2, -8.25), (2, -27.25), align=None)
    extrude(amount=BOSS_EXTRU_4_DEPTH)


solid = part.part
